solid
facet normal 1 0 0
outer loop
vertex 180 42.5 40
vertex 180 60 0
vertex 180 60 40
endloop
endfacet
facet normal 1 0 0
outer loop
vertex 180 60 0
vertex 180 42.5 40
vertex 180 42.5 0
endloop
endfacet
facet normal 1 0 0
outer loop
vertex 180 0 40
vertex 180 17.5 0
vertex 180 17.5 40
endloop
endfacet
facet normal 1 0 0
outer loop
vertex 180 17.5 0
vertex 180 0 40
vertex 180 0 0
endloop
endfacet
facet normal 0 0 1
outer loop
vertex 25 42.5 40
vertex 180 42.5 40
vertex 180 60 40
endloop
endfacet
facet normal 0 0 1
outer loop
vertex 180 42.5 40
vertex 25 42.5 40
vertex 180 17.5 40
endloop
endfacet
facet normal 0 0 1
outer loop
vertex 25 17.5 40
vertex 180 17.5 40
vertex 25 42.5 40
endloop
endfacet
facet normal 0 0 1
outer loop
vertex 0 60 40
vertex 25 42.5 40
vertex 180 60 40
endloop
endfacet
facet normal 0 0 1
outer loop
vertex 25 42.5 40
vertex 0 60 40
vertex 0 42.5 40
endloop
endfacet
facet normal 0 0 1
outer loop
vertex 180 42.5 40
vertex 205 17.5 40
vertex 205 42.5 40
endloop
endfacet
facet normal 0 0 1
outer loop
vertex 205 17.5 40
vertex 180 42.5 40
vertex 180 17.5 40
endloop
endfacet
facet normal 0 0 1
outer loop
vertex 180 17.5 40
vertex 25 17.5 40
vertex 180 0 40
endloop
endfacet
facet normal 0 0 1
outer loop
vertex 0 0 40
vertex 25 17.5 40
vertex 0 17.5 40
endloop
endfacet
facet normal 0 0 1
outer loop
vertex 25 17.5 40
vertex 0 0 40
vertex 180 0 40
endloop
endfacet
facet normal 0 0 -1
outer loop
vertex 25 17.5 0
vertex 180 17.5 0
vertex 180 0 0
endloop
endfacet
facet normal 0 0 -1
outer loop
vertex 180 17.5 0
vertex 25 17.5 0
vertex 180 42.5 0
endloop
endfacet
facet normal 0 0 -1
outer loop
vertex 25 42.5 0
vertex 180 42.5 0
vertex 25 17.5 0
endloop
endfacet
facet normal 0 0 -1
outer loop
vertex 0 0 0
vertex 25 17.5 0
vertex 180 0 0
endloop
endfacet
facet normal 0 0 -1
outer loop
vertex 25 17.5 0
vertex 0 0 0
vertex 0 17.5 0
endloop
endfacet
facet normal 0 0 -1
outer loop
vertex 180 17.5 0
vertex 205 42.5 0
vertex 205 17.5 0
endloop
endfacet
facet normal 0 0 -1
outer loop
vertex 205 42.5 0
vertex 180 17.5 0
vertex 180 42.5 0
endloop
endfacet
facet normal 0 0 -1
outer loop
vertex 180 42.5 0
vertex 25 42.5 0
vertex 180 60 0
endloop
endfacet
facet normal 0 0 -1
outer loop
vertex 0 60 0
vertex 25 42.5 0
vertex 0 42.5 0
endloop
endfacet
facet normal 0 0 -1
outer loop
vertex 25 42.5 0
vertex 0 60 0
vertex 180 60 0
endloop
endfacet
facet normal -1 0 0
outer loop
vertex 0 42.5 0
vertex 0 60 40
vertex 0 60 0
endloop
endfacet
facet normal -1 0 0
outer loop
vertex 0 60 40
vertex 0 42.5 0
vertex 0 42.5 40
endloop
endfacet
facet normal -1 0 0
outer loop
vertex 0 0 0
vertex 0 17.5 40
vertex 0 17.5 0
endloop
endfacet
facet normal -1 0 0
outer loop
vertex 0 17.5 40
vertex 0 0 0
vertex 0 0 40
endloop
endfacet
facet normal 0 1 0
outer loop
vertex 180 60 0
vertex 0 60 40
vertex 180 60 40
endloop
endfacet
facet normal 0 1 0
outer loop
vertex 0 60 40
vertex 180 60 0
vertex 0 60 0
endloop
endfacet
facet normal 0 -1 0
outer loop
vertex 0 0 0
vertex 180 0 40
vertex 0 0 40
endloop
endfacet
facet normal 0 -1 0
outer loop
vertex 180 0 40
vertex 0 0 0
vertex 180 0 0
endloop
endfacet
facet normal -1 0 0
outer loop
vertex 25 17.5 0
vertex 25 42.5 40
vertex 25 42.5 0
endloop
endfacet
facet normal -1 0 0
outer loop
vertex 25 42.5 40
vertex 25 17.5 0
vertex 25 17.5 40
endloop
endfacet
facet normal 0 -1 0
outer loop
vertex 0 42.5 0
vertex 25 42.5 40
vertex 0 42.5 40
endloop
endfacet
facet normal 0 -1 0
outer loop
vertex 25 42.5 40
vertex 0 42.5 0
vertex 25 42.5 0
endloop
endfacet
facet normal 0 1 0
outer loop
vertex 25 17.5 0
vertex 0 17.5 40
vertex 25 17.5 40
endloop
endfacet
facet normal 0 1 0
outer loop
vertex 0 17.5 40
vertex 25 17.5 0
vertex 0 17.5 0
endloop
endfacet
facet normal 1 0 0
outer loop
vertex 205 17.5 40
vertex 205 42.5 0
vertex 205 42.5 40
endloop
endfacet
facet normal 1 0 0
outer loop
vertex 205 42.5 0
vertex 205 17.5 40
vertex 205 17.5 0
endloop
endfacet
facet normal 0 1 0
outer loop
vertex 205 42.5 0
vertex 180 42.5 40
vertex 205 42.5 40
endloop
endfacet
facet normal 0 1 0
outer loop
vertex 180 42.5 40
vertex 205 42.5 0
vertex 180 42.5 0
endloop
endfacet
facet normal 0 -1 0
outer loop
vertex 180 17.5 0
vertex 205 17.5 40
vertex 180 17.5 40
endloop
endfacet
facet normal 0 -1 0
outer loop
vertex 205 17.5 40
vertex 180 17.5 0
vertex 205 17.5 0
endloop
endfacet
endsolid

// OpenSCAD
LenX=180;
WidthY=60;
HightZ=40;
Buff=5;
DB=Buff*2;
FeetDia=25;
YSpace=(WidthY-FeetDia)/2;

difference()
{
  cube([LenX,WidthY,HightZ]);
  translate([-Buff,YSpace,-Buff]) cube([FeetDia+Buff,FeetDia,HightZ+DB]);
}
translate([LenX,YSpace,0]) cube([FeetDia,FeetDia,HightZ]);
